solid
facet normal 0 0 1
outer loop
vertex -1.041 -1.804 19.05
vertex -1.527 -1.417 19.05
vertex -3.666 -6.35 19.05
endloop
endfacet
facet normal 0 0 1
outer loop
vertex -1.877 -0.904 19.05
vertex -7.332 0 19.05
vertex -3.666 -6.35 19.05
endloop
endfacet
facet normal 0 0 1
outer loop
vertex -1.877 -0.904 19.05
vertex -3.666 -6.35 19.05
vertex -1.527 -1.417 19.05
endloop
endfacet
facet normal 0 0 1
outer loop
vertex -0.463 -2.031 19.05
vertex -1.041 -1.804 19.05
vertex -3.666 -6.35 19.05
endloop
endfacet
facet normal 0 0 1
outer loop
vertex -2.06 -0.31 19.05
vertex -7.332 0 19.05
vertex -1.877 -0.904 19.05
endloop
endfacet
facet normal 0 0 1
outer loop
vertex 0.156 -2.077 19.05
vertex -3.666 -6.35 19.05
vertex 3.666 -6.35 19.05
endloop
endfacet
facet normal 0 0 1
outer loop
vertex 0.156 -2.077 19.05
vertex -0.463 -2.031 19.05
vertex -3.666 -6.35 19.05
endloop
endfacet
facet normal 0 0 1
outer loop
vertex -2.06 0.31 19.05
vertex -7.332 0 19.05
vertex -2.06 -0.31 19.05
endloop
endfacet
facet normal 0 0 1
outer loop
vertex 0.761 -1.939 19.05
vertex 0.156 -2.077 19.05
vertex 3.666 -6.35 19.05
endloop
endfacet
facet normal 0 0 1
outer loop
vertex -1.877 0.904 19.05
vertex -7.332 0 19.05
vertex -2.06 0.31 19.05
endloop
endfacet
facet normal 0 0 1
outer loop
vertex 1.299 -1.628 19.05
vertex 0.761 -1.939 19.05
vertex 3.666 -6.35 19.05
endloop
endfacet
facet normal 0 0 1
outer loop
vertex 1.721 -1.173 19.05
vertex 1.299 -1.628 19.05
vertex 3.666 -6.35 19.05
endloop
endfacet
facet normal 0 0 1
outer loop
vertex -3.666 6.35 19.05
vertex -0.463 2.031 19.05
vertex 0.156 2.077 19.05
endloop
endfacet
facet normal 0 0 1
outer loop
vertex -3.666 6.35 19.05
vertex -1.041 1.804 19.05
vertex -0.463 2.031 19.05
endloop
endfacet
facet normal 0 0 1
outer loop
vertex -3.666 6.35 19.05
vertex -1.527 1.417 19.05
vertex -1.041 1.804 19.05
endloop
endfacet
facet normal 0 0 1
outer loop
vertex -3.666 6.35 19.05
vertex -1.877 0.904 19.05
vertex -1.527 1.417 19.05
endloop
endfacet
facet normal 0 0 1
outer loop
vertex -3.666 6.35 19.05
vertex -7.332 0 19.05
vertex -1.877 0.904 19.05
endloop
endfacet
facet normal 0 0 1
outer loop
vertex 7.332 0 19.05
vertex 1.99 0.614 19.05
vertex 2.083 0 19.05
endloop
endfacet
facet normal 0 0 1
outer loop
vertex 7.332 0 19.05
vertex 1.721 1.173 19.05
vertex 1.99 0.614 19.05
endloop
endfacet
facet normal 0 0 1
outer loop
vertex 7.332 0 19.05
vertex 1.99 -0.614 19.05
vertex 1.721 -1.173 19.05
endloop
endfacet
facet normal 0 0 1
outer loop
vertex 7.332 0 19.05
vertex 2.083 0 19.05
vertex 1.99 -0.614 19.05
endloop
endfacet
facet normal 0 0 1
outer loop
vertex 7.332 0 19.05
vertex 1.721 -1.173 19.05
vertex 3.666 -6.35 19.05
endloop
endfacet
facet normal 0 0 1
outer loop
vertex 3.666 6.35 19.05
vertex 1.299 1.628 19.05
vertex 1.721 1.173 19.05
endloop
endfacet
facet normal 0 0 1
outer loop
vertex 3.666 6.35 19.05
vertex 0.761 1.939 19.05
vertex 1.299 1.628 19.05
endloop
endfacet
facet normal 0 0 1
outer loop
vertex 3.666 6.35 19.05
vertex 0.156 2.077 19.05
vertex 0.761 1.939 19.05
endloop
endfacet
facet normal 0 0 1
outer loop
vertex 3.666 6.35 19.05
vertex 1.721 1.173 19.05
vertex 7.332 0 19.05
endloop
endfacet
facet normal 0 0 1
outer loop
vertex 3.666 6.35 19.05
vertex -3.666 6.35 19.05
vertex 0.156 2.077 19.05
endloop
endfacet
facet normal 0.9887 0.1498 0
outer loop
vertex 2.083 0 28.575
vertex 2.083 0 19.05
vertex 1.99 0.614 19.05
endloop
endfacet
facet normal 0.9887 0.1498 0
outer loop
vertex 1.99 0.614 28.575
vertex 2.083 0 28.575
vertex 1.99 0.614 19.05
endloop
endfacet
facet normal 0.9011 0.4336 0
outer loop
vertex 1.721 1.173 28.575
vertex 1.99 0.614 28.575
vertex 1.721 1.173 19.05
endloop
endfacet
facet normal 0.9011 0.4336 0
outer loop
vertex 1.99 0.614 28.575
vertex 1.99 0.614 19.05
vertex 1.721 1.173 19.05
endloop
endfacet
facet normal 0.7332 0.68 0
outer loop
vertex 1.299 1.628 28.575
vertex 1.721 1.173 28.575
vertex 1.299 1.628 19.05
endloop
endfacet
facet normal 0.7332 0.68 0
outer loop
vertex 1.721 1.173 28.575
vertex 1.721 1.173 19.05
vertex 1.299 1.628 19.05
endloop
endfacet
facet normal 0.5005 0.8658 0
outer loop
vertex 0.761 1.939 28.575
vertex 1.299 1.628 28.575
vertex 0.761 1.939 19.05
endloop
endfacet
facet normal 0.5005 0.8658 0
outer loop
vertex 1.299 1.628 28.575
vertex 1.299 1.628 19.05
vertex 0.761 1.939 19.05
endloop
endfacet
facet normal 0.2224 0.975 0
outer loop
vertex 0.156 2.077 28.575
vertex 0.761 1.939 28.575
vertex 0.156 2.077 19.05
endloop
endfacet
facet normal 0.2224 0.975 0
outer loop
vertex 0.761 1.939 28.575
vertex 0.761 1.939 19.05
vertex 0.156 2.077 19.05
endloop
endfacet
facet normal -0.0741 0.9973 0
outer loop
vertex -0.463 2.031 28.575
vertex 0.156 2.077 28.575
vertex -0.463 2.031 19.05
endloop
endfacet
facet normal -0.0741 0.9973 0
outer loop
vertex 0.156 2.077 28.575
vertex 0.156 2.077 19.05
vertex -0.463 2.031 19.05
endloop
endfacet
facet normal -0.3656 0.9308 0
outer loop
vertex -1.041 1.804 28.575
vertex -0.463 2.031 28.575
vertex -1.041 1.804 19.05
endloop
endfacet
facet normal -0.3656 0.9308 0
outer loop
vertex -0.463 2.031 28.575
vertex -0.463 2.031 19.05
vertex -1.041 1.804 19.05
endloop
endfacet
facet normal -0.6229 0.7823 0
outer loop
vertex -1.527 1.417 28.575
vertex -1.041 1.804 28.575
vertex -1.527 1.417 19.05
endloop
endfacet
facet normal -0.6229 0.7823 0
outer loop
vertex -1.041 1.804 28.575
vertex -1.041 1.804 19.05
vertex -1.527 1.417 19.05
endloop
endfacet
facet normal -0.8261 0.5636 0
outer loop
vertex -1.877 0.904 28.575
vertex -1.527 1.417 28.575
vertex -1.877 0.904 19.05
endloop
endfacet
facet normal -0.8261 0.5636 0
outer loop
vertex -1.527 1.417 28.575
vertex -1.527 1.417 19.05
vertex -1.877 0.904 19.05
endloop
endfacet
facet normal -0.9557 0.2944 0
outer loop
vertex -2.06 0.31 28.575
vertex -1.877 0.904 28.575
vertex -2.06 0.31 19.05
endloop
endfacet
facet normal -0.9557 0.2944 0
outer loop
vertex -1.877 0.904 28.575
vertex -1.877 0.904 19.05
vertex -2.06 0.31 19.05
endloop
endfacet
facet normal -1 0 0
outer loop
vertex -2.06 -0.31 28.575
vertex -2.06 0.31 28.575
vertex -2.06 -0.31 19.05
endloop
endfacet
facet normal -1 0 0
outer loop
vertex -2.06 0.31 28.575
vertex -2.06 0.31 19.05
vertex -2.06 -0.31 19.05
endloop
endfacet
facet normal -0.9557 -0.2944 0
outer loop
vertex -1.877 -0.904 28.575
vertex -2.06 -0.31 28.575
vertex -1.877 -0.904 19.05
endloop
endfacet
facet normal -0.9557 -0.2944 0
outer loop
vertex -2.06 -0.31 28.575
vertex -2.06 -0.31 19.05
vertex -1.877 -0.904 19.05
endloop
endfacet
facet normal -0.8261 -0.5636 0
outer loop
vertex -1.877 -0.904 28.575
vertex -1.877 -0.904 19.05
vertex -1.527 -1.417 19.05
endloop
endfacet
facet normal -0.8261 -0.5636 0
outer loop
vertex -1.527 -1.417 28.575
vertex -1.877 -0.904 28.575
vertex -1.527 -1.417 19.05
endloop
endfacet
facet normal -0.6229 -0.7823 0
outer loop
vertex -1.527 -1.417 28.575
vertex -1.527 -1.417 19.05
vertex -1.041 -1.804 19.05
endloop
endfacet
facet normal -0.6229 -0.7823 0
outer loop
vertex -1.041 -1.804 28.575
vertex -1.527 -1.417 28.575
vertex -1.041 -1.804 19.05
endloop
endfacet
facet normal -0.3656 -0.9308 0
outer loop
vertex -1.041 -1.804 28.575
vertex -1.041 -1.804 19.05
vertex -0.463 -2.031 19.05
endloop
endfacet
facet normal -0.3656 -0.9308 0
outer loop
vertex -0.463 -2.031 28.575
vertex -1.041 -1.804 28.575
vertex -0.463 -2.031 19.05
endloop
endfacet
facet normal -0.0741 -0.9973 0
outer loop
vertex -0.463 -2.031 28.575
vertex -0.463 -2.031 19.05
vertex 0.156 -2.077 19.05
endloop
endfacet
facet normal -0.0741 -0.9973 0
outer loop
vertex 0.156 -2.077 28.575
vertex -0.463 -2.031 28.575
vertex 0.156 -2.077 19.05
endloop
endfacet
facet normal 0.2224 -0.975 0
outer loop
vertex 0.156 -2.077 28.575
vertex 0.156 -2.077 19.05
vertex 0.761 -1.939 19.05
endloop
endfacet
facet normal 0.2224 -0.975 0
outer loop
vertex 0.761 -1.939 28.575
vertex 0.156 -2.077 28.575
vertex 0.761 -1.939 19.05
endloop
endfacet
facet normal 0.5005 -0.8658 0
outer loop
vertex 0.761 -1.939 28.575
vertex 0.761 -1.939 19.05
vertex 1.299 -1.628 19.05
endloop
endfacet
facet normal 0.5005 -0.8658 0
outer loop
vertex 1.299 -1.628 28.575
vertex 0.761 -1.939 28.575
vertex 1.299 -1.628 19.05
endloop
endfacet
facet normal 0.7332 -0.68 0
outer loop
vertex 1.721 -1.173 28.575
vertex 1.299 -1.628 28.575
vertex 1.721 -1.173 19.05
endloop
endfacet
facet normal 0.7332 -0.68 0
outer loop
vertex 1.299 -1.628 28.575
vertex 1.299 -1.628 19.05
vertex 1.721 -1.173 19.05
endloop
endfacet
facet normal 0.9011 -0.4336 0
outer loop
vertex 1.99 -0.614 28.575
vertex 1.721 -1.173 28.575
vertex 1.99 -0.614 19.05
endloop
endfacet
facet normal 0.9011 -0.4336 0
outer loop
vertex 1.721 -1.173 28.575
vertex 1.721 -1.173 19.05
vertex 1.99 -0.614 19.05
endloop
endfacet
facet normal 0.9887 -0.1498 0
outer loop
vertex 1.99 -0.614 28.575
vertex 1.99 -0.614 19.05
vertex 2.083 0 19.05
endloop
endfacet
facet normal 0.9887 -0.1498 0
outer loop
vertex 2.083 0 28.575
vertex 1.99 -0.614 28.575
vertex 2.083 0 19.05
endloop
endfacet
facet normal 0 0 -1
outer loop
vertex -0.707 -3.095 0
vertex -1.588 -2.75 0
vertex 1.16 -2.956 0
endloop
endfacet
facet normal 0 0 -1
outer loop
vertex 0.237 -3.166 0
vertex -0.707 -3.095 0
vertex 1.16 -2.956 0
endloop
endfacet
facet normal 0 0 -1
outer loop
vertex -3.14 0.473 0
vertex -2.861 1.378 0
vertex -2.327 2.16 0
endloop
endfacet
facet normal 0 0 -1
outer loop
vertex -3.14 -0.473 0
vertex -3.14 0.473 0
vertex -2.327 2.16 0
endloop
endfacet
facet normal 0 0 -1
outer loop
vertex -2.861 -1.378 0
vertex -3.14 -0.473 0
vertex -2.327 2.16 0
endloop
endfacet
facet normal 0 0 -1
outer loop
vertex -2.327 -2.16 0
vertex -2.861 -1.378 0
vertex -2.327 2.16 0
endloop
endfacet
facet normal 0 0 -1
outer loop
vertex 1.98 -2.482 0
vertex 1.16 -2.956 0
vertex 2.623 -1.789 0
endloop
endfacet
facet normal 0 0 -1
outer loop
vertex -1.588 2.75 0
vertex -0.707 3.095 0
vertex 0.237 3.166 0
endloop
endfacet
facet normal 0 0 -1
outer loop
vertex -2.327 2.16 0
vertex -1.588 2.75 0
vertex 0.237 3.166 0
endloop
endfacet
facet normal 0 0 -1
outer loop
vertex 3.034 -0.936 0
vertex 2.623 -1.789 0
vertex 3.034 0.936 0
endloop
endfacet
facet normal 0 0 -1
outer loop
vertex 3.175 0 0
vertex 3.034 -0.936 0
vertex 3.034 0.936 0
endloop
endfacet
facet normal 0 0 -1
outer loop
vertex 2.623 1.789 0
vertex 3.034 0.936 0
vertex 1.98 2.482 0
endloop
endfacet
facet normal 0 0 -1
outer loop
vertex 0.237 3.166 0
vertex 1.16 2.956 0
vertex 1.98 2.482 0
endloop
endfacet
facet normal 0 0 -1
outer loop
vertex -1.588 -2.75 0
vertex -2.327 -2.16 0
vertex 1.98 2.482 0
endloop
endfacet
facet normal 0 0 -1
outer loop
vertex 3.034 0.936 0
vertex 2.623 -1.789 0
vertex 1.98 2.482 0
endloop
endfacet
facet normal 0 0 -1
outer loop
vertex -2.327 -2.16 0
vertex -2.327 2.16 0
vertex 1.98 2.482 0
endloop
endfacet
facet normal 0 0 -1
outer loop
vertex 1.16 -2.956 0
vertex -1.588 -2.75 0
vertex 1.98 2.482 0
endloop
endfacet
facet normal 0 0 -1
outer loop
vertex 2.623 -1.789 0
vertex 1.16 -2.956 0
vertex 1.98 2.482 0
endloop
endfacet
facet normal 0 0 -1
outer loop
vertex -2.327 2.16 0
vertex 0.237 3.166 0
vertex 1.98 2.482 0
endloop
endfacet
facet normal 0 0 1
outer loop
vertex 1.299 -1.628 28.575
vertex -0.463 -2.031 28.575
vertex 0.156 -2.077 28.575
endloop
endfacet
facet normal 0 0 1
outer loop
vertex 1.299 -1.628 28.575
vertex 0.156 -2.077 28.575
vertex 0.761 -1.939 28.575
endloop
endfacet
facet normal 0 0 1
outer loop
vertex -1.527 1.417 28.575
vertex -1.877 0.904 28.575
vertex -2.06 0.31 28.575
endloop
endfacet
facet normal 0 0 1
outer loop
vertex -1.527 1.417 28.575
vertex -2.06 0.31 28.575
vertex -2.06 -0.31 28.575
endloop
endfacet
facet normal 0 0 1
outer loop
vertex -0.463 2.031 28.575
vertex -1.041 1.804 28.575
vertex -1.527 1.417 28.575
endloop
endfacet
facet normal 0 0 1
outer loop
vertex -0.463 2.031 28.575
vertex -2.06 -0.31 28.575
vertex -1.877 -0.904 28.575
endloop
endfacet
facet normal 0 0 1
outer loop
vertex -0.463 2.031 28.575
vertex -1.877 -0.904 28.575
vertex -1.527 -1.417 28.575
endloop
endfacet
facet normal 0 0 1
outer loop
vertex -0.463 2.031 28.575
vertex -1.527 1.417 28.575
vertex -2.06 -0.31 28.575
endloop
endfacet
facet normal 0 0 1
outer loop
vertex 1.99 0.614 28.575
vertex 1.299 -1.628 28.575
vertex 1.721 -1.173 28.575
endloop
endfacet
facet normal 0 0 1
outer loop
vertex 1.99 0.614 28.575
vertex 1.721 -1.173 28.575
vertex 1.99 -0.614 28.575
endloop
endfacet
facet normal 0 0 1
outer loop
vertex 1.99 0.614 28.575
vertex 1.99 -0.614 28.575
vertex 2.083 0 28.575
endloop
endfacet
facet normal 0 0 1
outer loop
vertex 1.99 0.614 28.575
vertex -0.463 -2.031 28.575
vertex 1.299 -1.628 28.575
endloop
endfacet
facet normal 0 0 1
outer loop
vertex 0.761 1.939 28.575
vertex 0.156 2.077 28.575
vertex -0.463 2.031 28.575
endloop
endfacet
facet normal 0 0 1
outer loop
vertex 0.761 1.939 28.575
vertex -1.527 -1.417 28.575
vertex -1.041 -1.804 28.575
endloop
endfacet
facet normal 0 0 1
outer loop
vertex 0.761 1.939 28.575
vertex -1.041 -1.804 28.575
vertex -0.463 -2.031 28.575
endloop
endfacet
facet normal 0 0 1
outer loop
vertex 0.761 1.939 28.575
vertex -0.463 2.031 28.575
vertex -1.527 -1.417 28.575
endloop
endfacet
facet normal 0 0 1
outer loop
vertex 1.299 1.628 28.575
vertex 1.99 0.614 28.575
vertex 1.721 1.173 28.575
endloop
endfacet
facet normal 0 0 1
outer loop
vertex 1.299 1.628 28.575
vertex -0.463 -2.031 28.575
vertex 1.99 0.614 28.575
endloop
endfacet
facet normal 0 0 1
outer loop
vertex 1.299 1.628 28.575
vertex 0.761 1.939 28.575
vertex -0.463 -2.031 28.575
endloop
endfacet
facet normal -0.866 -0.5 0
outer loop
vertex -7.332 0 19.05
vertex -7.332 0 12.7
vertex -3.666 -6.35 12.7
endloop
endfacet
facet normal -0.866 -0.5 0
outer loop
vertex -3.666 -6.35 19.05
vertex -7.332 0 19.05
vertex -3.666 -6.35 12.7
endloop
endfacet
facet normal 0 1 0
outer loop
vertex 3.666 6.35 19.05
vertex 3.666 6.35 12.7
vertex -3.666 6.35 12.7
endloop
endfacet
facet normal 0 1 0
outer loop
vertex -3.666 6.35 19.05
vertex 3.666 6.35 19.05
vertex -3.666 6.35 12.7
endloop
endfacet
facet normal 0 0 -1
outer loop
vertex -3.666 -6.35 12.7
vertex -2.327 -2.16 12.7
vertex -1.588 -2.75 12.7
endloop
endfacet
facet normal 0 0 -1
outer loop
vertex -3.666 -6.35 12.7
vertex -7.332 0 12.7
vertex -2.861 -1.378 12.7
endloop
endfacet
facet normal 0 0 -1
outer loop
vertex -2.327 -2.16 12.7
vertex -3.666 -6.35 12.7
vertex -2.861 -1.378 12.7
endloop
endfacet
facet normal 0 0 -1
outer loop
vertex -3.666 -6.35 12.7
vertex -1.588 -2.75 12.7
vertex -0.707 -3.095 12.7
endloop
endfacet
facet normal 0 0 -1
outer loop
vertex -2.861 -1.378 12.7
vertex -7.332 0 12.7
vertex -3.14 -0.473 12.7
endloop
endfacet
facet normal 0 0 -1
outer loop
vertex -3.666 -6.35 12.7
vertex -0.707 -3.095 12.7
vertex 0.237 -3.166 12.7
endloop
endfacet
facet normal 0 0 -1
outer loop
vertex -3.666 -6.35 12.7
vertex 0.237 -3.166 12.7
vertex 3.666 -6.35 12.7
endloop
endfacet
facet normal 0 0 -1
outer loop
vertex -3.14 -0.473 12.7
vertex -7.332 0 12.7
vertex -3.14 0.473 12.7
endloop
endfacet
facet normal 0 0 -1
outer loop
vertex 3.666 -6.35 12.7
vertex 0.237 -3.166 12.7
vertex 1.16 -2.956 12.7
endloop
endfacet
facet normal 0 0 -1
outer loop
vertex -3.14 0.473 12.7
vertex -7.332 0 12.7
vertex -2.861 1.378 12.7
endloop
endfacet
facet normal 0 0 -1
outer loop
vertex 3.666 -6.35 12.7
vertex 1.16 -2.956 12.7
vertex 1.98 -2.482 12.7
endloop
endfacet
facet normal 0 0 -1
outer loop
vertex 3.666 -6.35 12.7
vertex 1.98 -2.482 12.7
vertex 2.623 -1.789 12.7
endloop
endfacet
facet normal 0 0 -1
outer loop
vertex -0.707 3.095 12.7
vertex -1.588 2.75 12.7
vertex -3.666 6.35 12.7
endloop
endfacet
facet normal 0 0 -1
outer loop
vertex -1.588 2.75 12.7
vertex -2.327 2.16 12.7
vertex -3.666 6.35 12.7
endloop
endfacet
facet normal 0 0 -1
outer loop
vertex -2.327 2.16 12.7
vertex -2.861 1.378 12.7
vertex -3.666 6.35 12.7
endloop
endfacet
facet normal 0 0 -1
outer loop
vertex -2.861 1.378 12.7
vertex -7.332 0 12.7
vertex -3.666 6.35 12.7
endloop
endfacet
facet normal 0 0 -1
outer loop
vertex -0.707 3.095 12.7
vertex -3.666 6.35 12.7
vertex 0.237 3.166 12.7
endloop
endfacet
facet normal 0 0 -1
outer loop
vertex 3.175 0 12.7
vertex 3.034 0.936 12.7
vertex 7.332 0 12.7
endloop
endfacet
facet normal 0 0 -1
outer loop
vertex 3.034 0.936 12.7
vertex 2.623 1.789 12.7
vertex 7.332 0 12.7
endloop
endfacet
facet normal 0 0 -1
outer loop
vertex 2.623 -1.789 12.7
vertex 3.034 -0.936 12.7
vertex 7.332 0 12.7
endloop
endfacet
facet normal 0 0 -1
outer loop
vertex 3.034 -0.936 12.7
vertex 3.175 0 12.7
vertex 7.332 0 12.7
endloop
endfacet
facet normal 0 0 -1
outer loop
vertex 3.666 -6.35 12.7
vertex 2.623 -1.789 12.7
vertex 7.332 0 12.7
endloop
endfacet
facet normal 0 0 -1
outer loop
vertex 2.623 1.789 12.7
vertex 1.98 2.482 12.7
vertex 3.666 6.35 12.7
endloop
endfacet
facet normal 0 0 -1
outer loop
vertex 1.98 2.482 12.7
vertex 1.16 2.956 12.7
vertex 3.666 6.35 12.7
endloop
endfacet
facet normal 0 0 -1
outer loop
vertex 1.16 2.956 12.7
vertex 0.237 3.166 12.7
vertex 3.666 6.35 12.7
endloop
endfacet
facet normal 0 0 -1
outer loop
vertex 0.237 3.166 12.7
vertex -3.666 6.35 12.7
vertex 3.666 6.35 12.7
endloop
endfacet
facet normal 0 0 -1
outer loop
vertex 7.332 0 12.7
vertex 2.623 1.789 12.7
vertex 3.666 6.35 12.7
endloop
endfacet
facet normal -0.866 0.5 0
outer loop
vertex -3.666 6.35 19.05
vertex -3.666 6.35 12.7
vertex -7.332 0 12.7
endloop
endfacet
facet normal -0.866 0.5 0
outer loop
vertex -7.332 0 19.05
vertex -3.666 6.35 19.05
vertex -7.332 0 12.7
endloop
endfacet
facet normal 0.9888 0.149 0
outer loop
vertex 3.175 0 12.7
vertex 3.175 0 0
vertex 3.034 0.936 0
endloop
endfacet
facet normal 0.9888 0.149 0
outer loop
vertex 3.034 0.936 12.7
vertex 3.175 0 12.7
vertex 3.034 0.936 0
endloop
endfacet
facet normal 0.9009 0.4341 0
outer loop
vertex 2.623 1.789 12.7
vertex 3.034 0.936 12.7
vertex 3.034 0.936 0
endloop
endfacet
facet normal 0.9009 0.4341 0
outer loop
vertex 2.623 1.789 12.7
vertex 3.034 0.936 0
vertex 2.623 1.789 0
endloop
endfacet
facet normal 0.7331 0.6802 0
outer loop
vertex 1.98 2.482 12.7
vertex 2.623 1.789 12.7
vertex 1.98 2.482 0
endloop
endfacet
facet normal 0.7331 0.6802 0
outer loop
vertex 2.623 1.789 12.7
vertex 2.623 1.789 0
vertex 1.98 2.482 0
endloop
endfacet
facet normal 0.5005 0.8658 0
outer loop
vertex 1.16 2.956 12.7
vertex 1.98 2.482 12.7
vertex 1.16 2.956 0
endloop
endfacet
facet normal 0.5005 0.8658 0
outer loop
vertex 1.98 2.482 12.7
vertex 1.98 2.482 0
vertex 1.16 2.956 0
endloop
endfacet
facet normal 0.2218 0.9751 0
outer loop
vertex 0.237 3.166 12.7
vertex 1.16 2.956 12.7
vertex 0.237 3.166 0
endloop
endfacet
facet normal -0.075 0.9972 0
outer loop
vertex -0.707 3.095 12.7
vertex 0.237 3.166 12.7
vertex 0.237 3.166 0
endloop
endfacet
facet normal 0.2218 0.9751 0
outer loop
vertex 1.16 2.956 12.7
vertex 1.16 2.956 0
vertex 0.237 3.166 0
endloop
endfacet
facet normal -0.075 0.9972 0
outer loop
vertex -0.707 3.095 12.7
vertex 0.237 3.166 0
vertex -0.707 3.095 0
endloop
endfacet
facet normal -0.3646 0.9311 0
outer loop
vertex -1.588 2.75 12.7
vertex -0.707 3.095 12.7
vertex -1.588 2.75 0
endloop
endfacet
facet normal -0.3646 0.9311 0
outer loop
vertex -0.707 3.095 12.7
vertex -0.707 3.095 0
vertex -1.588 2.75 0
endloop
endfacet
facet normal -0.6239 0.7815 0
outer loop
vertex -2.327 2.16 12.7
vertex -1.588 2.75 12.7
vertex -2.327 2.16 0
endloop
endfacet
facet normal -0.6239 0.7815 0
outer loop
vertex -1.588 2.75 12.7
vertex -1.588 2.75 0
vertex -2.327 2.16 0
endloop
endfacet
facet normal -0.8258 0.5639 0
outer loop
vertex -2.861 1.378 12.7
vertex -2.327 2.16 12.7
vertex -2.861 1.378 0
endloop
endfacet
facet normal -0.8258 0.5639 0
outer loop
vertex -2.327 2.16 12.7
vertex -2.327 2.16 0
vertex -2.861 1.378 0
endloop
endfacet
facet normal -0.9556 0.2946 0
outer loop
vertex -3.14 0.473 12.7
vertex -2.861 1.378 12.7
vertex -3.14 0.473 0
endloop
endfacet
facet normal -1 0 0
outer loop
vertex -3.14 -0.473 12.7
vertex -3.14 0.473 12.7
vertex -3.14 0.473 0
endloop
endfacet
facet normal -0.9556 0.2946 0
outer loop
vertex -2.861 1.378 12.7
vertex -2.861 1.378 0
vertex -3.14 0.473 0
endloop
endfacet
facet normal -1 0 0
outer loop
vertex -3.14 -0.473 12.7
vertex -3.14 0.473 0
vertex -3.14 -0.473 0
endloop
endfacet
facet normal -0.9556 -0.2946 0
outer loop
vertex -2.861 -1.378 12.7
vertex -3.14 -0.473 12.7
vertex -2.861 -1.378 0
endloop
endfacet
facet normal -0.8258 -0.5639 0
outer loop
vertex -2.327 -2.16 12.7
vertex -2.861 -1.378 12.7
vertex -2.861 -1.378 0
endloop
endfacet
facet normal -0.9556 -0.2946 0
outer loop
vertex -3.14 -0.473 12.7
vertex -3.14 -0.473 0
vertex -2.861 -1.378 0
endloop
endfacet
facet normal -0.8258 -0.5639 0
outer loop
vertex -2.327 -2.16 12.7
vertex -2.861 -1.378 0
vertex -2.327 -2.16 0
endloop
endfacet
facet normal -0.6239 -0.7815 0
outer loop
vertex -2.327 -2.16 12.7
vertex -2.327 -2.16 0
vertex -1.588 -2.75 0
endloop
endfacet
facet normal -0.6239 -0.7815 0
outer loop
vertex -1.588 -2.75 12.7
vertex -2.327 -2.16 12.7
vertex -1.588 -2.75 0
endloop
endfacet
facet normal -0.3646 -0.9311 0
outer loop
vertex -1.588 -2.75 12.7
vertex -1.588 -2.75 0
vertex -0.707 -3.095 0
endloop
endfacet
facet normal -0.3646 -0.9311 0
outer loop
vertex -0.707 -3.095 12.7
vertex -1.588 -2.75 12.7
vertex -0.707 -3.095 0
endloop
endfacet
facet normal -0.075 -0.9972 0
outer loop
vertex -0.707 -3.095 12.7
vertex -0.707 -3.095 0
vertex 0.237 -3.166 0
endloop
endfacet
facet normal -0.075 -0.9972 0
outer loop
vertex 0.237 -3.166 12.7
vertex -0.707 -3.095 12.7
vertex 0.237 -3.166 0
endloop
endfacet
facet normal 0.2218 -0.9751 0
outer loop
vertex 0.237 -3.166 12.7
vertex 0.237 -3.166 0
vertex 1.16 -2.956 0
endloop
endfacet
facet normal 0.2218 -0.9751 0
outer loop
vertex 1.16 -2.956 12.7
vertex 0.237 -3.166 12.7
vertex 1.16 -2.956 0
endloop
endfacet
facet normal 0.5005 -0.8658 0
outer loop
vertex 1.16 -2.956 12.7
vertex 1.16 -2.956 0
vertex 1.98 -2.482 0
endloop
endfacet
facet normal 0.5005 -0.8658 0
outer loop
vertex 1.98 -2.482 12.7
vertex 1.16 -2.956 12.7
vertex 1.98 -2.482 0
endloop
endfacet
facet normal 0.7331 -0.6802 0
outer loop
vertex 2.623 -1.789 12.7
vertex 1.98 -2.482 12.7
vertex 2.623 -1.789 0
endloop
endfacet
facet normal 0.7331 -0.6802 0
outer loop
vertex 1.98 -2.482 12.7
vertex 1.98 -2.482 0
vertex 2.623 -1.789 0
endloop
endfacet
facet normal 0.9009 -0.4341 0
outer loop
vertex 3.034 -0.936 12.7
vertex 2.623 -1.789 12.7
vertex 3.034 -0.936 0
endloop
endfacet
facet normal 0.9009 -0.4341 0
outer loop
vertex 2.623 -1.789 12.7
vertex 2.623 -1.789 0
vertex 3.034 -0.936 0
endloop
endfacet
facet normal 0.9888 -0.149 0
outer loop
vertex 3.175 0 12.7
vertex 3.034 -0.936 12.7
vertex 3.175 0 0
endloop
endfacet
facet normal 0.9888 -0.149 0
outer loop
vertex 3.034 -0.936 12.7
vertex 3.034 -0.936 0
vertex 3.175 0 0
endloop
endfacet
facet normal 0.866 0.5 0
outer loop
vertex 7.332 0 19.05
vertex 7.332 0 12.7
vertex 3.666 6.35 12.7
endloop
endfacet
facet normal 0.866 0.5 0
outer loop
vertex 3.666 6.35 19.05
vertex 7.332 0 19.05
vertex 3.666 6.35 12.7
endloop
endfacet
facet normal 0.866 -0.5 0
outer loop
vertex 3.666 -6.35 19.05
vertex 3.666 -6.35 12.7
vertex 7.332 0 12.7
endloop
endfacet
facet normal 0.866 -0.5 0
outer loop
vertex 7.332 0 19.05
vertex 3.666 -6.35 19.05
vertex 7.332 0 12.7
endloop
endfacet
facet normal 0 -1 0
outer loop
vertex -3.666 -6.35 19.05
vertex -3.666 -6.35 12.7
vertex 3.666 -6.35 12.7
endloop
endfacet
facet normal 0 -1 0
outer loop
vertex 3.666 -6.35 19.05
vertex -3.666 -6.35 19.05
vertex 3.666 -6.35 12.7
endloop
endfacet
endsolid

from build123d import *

# Parameters (mm, degrees)
SKETCH1_R           = 3.175
BOSS_EXTRUDE1_DEPTH = 12.7
BOSS_EXTRUDE2_DEPTH = 6.35
SKETCH3_R           = 2.0828
BOSS_EXTRUDE3_DEPTH = 9.525


with BuildPart() as part:
    # Sketch1 → Boss-Extrude1 (new body)
    with BuildSketch(Plane.XY):
        Circle(SKETCH1_R)
    extrude(amount=BOSS_EXTRUDE1_DEPTH)

    # Sketch2 → Boss-Extrude2 (add)
    with BuildSketch(Plane.XY.offset(12.7)):
        Polygon((3.666174209, -6.35), (7.332348419, 0), (3.666174209, 6.35), (-3.666174209, 6.35), (-7.332348419, 0), (-3.666174209, -6.35), align=None)
    extrude(amount=BOSS_EXTRUDE2_DEPTH)

    # Sketch3 → Boss-Extrude3 (add)
    with BuildSketch(Plane.XY.offset(19.05)):
        Circle(SKETCH3_R)
    extrude(amount=BOSS_EXTRUDE3_DEPTH)


solid = part.part
